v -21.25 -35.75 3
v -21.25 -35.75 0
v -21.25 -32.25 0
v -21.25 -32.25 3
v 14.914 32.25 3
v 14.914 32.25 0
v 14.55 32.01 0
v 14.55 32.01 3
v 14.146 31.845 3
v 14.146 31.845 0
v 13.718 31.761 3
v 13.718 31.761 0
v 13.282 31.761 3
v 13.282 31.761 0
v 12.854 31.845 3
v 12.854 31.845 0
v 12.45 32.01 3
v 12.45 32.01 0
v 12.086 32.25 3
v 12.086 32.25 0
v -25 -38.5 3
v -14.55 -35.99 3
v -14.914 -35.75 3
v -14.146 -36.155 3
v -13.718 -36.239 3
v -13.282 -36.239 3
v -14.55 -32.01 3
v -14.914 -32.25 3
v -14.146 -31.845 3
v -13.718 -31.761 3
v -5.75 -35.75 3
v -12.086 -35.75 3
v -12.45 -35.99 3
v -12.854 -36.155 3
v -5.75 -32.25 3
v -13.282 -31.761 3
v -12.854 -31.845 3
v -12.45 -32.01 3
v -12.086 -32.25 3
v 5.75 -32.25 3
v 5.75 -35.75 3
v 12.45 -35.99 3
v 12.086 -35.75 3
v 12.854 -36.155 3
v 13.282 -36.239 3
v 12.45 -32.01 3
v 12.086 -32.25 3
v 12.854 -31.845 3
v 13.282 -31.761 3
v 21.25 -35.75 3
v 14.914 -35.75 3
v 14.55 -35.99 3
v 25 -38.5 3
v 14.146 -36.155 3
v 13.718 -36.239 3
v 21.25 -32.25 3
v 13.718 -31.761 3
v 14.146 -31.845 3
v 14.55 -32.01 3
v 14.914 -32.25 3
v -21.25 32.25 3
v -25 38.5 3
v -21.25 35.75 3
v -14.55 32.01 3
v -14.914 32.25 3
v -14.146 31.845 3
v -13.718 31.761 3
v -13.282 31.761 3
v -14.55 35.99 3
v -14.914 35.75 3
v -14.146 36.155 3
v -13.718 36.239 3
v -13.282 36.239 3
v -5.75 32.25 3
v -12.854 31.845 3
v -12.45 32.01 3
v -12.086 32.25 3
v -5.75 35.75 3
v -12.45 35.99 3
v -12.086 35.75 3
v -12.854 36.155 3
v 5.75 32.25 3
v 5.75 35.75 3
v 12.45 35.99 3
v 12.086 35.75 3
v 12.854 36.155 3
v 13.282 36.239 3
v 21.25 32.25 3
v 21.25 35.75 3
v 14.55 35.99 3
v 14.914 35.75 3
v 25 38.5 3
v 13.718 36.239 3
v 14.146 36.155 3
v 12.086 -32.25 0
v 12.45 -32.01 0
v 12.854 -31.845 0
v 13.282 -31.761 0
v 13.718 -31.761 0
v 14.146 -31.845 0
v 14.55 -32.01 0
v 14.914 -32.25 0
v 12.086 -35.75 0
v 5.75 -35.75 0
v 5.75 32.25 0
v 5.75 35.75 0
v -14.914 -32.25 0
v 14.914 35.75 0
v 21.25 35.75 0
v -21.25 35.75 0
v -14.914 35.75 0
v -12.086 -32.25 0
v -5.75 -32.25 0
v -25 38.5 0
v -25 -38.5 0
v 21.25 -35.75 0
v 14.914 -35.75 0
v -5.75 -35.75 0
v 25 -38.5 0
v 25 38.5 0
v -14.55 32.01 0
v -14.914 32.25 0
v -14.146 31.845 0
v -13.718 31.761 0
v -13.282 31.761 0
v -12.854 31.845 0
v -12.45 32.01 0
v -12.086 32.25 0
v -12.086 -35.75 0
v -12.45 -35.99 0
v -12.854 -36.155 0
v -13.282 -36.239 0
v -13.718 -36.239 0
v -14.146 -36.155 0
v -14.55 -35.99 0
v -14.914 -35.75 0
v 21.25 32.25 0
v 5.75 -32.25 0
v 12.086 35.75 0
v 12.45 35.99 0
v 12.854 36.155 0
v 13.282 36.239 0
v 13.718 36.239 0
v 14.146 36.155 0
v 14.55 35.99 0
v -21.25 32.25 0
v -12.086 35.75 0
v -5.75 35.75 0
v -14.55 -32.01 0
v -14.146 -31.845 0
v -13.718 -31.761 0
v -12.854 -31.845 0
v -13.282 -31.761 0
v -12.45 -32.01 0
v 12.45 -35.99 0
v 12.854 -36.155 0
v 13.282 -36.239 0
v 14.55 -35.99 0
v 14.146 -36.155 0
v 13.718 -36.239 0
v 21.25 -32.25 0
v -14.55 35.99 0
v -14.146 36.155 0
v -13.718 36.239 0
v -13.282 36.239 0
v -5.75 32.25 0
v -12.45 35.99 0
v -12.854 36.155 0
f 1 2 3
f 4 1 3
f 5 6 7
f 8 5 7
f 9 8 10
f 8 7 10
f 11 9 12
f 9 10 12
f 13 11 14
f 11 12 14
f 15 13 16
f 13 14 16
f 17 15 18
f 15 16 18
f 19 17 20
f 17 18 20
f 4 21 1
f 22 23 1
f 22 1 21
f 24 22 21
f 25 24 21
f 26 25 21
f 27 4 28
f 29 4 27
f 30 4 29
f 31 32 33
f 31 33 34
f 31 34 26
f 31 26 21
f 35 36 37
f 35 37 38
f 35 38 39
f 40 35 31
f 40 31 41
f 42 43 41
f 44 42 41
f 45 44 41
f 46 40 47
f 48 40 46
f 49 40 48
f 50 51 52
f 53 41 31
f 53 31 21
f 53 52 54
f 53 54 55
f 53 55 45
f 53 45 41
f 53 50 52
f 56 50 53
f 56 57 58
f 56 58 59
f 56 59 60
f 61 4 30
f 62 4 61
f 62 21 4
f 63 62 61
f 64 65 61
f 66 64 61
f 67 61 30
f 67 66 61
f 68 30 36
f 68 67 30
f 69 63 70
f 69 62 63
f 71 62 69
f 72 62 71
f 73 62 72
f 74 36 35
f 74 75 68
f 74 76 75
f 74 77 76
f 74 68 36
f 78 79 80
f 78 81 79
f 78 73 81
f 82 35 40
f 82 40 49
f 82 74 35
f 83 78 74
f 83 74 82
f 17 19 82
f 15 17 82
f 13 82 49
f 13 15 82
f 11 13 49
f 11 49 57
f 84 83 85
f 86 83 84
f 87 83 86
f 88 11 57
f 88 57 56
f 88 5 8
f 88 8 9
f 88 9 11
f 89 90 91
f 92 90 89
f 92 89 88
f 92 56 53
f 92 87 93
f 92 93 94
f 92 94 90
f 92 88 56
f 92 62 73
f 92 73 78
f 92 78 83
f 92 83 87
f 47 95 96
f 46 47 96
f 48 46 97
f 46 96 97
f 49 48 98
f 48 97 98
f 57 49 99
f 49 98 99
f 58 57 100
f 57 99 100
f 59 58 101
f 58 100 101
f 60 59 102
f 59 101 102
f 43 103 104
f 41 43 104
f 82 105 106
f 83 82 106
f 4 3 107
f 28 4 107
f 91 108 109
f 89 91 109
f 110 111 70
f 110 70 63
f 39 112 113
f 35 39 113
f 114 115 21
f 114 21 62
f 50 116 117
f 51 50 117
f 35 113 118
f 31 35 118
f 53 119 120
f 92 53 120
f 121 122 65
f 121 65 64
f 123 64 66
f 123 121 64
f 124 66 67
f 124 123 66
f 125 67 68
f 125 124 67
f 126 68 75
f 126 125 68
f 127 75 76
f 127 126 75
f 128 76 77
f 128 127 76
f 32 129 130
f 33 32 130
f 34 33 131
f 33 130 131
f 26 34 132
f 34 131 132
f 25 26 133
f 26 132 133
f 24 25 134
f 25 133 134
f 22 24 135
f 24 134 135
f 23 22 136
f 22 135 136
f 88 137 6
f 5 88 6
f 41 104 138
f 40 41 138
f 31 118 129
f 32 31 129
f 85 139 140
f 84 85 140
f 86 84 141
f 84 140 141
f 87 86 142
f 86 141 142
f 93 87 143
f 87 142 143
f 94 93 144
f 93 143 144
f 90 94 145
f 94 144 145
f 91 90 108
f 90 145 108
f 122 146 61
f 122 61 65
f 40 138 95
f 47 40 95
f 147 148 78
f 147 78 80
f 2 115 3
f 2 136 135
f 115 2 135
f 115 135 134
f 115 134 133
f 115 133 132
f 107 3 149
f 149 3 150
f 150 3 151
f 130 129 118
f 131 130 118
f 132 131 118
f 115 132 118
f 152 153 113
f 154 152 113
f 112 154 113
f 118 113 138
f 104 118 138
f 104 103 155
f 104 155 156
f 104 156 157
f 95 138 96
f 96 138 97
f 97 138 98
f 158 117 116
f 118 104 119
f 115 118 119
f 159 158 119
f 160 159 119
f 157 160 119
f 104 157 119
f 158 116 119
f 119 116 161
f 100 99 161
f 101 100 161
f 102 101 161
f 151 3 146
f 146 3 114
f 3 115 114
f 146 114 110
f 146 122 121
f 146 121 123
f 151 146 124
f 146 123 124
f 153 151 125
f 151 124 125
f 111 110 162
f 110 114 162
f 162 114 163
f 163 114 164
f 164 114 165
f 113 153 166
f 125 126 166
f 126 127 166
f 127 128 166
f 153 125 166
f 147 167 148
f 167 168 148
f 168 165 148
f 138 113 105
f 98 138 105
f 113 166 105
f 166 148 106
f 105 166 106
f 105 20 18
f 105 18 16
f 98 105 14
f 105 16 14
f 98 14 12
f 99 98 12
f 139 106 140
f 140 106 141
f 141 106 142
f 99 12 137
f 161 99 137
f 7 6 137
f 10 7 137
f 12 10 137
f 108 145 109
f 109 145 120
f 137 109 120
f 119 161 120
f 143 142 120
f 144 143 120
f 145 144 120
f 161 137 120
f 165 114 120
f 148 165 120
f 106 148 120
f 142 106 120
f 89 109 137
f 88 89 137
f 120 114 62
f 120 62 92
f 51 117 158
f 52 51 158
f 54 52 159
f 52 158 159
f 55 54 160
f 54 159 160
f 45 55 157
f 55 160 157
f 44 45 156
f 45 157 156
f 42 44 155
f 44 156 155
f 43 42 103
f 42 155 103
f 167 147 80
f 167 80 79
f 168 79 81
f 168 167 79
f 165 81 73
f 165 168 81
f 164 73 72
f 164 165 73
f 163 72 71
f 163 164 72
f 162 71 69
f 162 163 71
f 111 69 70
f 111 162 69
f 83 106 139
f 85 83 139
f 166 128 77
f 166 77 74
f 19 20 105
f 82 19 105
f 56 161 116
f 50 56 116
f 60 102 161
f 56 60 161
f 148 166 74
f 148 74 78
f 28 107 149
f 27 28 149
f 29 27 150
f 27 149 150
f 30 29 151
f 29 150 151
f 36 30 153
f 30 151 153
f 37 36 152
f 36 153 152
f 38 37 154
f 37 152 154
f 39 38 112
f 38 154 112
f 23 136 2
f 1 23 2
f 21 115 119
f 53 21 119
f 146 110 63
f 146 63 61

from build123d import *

# Parameters (mm, degrees)
SKETCH_1_W      = 50
SKETCH_1_H      = 77
EXTRUDE_1_DEPTH = 3


with BuildPart() as part:
    # 草图1 → 凸台-拉伸1 (new body)
    with BuildSketch(Plane.XY):
        Rectangle(SKETCH_1_W, SKETCH_1_H)
        with BuildLine():
            Line((-12.085786438, 32.25), (-5.75, 32.25))
            Line((-5.75, 32.25), (-5.75, 35.75))
            Line((-5.75, 35.75), (-12.085786438, 35.75))
            ThreePointArc((-12.085786438, 35.75), (-13.5, 36.25), (-14.914213562, 35.75))
            Line((-14.914213562, 35.75), (-21.25, 35.75))
            Line((-21.25, 35.75), (-21.25, 32.25))
            Line((-21.25, 32.25), (-14.914213562, 32.25))
            ThreePointArc((-14.914213562, 32.25), (-13.5, 31.75), (-12.085786438, 32.25))
        make_face(mode=Mode.SUBTRACT)
        with BuildLine():
            Line((21.25, 35.75), (21.25, 32.25))
            Line((21.25, 32.25), (14.914213562, 32.25))
            ThreePointArc((14.914213562, 32.25), (13.5, 31.75), (12.085786438, 32.25))
            Line((12.085786438, 32.25), (5.75, 32.25))
            Line((5.75, 32.25), (5.75, 35.75))
            Line((5.75, 35.75), (12.085786438, 35.75))
            ThreePointArc((12.085786438, 35.75), (13.5, 36.25), (14.914213562, 35.75))
            Line((14.914213562, 35.75), (21.25, 35.75))
        make_face(mode=Mode.SUBTRACT)
        with BuildLine():
            Line((21.25, -35.75), (14.914213562, -35.75))
            ThreePointArc((14.914213562, -35.75), (13.5, -36.25), (12.085786438, -35.75))
            Line((12.085786438, -35.75), (5.75, -35.75))
            Line((5.75, -35.75), (5.75, -32.25))
            Line((5.75, -32.25), (12.085786438, -32.25))
            ThreePointArc((12.085786438, -32.25), (13.5, -31.75), (14.914213562, -32.25))
            Line((14.914213562, -32.25), (21.25, -32.25))
            Line((21.25, -32.25), (21.25, -35.75))
        make_face(mode=Mode.SUBTRACT)
        with BuildLine():
            Line((-21.25, -35.75), (-21.25, -32.25))
            Line((-21.25, -32.25), (-14.914213562, -32.25))
            ThreePointArc((-14.914213562, -32.25), (-13.5, -31.75), (-12.085786438, -32.25))
            Line((-12.085786438, -32.25), (-5.75, -32.25))
            Line((-5.75, -32.25), (-5.75, -35.75))
            Line((-5.75, -35.75), (-12.085786438, -35.75))
            ThreePointArc((-12.085786438, -35.75), (-13.5, -36.25), (-14.914213562, -35.75))
            Line((-14.914213562, -35.75), (-21.25, -35.75))
        make_face(mode=Mode.SUBTRACT)
    extrude(amount=EXTRUDE_1_DEPTH)


solid = part.part
